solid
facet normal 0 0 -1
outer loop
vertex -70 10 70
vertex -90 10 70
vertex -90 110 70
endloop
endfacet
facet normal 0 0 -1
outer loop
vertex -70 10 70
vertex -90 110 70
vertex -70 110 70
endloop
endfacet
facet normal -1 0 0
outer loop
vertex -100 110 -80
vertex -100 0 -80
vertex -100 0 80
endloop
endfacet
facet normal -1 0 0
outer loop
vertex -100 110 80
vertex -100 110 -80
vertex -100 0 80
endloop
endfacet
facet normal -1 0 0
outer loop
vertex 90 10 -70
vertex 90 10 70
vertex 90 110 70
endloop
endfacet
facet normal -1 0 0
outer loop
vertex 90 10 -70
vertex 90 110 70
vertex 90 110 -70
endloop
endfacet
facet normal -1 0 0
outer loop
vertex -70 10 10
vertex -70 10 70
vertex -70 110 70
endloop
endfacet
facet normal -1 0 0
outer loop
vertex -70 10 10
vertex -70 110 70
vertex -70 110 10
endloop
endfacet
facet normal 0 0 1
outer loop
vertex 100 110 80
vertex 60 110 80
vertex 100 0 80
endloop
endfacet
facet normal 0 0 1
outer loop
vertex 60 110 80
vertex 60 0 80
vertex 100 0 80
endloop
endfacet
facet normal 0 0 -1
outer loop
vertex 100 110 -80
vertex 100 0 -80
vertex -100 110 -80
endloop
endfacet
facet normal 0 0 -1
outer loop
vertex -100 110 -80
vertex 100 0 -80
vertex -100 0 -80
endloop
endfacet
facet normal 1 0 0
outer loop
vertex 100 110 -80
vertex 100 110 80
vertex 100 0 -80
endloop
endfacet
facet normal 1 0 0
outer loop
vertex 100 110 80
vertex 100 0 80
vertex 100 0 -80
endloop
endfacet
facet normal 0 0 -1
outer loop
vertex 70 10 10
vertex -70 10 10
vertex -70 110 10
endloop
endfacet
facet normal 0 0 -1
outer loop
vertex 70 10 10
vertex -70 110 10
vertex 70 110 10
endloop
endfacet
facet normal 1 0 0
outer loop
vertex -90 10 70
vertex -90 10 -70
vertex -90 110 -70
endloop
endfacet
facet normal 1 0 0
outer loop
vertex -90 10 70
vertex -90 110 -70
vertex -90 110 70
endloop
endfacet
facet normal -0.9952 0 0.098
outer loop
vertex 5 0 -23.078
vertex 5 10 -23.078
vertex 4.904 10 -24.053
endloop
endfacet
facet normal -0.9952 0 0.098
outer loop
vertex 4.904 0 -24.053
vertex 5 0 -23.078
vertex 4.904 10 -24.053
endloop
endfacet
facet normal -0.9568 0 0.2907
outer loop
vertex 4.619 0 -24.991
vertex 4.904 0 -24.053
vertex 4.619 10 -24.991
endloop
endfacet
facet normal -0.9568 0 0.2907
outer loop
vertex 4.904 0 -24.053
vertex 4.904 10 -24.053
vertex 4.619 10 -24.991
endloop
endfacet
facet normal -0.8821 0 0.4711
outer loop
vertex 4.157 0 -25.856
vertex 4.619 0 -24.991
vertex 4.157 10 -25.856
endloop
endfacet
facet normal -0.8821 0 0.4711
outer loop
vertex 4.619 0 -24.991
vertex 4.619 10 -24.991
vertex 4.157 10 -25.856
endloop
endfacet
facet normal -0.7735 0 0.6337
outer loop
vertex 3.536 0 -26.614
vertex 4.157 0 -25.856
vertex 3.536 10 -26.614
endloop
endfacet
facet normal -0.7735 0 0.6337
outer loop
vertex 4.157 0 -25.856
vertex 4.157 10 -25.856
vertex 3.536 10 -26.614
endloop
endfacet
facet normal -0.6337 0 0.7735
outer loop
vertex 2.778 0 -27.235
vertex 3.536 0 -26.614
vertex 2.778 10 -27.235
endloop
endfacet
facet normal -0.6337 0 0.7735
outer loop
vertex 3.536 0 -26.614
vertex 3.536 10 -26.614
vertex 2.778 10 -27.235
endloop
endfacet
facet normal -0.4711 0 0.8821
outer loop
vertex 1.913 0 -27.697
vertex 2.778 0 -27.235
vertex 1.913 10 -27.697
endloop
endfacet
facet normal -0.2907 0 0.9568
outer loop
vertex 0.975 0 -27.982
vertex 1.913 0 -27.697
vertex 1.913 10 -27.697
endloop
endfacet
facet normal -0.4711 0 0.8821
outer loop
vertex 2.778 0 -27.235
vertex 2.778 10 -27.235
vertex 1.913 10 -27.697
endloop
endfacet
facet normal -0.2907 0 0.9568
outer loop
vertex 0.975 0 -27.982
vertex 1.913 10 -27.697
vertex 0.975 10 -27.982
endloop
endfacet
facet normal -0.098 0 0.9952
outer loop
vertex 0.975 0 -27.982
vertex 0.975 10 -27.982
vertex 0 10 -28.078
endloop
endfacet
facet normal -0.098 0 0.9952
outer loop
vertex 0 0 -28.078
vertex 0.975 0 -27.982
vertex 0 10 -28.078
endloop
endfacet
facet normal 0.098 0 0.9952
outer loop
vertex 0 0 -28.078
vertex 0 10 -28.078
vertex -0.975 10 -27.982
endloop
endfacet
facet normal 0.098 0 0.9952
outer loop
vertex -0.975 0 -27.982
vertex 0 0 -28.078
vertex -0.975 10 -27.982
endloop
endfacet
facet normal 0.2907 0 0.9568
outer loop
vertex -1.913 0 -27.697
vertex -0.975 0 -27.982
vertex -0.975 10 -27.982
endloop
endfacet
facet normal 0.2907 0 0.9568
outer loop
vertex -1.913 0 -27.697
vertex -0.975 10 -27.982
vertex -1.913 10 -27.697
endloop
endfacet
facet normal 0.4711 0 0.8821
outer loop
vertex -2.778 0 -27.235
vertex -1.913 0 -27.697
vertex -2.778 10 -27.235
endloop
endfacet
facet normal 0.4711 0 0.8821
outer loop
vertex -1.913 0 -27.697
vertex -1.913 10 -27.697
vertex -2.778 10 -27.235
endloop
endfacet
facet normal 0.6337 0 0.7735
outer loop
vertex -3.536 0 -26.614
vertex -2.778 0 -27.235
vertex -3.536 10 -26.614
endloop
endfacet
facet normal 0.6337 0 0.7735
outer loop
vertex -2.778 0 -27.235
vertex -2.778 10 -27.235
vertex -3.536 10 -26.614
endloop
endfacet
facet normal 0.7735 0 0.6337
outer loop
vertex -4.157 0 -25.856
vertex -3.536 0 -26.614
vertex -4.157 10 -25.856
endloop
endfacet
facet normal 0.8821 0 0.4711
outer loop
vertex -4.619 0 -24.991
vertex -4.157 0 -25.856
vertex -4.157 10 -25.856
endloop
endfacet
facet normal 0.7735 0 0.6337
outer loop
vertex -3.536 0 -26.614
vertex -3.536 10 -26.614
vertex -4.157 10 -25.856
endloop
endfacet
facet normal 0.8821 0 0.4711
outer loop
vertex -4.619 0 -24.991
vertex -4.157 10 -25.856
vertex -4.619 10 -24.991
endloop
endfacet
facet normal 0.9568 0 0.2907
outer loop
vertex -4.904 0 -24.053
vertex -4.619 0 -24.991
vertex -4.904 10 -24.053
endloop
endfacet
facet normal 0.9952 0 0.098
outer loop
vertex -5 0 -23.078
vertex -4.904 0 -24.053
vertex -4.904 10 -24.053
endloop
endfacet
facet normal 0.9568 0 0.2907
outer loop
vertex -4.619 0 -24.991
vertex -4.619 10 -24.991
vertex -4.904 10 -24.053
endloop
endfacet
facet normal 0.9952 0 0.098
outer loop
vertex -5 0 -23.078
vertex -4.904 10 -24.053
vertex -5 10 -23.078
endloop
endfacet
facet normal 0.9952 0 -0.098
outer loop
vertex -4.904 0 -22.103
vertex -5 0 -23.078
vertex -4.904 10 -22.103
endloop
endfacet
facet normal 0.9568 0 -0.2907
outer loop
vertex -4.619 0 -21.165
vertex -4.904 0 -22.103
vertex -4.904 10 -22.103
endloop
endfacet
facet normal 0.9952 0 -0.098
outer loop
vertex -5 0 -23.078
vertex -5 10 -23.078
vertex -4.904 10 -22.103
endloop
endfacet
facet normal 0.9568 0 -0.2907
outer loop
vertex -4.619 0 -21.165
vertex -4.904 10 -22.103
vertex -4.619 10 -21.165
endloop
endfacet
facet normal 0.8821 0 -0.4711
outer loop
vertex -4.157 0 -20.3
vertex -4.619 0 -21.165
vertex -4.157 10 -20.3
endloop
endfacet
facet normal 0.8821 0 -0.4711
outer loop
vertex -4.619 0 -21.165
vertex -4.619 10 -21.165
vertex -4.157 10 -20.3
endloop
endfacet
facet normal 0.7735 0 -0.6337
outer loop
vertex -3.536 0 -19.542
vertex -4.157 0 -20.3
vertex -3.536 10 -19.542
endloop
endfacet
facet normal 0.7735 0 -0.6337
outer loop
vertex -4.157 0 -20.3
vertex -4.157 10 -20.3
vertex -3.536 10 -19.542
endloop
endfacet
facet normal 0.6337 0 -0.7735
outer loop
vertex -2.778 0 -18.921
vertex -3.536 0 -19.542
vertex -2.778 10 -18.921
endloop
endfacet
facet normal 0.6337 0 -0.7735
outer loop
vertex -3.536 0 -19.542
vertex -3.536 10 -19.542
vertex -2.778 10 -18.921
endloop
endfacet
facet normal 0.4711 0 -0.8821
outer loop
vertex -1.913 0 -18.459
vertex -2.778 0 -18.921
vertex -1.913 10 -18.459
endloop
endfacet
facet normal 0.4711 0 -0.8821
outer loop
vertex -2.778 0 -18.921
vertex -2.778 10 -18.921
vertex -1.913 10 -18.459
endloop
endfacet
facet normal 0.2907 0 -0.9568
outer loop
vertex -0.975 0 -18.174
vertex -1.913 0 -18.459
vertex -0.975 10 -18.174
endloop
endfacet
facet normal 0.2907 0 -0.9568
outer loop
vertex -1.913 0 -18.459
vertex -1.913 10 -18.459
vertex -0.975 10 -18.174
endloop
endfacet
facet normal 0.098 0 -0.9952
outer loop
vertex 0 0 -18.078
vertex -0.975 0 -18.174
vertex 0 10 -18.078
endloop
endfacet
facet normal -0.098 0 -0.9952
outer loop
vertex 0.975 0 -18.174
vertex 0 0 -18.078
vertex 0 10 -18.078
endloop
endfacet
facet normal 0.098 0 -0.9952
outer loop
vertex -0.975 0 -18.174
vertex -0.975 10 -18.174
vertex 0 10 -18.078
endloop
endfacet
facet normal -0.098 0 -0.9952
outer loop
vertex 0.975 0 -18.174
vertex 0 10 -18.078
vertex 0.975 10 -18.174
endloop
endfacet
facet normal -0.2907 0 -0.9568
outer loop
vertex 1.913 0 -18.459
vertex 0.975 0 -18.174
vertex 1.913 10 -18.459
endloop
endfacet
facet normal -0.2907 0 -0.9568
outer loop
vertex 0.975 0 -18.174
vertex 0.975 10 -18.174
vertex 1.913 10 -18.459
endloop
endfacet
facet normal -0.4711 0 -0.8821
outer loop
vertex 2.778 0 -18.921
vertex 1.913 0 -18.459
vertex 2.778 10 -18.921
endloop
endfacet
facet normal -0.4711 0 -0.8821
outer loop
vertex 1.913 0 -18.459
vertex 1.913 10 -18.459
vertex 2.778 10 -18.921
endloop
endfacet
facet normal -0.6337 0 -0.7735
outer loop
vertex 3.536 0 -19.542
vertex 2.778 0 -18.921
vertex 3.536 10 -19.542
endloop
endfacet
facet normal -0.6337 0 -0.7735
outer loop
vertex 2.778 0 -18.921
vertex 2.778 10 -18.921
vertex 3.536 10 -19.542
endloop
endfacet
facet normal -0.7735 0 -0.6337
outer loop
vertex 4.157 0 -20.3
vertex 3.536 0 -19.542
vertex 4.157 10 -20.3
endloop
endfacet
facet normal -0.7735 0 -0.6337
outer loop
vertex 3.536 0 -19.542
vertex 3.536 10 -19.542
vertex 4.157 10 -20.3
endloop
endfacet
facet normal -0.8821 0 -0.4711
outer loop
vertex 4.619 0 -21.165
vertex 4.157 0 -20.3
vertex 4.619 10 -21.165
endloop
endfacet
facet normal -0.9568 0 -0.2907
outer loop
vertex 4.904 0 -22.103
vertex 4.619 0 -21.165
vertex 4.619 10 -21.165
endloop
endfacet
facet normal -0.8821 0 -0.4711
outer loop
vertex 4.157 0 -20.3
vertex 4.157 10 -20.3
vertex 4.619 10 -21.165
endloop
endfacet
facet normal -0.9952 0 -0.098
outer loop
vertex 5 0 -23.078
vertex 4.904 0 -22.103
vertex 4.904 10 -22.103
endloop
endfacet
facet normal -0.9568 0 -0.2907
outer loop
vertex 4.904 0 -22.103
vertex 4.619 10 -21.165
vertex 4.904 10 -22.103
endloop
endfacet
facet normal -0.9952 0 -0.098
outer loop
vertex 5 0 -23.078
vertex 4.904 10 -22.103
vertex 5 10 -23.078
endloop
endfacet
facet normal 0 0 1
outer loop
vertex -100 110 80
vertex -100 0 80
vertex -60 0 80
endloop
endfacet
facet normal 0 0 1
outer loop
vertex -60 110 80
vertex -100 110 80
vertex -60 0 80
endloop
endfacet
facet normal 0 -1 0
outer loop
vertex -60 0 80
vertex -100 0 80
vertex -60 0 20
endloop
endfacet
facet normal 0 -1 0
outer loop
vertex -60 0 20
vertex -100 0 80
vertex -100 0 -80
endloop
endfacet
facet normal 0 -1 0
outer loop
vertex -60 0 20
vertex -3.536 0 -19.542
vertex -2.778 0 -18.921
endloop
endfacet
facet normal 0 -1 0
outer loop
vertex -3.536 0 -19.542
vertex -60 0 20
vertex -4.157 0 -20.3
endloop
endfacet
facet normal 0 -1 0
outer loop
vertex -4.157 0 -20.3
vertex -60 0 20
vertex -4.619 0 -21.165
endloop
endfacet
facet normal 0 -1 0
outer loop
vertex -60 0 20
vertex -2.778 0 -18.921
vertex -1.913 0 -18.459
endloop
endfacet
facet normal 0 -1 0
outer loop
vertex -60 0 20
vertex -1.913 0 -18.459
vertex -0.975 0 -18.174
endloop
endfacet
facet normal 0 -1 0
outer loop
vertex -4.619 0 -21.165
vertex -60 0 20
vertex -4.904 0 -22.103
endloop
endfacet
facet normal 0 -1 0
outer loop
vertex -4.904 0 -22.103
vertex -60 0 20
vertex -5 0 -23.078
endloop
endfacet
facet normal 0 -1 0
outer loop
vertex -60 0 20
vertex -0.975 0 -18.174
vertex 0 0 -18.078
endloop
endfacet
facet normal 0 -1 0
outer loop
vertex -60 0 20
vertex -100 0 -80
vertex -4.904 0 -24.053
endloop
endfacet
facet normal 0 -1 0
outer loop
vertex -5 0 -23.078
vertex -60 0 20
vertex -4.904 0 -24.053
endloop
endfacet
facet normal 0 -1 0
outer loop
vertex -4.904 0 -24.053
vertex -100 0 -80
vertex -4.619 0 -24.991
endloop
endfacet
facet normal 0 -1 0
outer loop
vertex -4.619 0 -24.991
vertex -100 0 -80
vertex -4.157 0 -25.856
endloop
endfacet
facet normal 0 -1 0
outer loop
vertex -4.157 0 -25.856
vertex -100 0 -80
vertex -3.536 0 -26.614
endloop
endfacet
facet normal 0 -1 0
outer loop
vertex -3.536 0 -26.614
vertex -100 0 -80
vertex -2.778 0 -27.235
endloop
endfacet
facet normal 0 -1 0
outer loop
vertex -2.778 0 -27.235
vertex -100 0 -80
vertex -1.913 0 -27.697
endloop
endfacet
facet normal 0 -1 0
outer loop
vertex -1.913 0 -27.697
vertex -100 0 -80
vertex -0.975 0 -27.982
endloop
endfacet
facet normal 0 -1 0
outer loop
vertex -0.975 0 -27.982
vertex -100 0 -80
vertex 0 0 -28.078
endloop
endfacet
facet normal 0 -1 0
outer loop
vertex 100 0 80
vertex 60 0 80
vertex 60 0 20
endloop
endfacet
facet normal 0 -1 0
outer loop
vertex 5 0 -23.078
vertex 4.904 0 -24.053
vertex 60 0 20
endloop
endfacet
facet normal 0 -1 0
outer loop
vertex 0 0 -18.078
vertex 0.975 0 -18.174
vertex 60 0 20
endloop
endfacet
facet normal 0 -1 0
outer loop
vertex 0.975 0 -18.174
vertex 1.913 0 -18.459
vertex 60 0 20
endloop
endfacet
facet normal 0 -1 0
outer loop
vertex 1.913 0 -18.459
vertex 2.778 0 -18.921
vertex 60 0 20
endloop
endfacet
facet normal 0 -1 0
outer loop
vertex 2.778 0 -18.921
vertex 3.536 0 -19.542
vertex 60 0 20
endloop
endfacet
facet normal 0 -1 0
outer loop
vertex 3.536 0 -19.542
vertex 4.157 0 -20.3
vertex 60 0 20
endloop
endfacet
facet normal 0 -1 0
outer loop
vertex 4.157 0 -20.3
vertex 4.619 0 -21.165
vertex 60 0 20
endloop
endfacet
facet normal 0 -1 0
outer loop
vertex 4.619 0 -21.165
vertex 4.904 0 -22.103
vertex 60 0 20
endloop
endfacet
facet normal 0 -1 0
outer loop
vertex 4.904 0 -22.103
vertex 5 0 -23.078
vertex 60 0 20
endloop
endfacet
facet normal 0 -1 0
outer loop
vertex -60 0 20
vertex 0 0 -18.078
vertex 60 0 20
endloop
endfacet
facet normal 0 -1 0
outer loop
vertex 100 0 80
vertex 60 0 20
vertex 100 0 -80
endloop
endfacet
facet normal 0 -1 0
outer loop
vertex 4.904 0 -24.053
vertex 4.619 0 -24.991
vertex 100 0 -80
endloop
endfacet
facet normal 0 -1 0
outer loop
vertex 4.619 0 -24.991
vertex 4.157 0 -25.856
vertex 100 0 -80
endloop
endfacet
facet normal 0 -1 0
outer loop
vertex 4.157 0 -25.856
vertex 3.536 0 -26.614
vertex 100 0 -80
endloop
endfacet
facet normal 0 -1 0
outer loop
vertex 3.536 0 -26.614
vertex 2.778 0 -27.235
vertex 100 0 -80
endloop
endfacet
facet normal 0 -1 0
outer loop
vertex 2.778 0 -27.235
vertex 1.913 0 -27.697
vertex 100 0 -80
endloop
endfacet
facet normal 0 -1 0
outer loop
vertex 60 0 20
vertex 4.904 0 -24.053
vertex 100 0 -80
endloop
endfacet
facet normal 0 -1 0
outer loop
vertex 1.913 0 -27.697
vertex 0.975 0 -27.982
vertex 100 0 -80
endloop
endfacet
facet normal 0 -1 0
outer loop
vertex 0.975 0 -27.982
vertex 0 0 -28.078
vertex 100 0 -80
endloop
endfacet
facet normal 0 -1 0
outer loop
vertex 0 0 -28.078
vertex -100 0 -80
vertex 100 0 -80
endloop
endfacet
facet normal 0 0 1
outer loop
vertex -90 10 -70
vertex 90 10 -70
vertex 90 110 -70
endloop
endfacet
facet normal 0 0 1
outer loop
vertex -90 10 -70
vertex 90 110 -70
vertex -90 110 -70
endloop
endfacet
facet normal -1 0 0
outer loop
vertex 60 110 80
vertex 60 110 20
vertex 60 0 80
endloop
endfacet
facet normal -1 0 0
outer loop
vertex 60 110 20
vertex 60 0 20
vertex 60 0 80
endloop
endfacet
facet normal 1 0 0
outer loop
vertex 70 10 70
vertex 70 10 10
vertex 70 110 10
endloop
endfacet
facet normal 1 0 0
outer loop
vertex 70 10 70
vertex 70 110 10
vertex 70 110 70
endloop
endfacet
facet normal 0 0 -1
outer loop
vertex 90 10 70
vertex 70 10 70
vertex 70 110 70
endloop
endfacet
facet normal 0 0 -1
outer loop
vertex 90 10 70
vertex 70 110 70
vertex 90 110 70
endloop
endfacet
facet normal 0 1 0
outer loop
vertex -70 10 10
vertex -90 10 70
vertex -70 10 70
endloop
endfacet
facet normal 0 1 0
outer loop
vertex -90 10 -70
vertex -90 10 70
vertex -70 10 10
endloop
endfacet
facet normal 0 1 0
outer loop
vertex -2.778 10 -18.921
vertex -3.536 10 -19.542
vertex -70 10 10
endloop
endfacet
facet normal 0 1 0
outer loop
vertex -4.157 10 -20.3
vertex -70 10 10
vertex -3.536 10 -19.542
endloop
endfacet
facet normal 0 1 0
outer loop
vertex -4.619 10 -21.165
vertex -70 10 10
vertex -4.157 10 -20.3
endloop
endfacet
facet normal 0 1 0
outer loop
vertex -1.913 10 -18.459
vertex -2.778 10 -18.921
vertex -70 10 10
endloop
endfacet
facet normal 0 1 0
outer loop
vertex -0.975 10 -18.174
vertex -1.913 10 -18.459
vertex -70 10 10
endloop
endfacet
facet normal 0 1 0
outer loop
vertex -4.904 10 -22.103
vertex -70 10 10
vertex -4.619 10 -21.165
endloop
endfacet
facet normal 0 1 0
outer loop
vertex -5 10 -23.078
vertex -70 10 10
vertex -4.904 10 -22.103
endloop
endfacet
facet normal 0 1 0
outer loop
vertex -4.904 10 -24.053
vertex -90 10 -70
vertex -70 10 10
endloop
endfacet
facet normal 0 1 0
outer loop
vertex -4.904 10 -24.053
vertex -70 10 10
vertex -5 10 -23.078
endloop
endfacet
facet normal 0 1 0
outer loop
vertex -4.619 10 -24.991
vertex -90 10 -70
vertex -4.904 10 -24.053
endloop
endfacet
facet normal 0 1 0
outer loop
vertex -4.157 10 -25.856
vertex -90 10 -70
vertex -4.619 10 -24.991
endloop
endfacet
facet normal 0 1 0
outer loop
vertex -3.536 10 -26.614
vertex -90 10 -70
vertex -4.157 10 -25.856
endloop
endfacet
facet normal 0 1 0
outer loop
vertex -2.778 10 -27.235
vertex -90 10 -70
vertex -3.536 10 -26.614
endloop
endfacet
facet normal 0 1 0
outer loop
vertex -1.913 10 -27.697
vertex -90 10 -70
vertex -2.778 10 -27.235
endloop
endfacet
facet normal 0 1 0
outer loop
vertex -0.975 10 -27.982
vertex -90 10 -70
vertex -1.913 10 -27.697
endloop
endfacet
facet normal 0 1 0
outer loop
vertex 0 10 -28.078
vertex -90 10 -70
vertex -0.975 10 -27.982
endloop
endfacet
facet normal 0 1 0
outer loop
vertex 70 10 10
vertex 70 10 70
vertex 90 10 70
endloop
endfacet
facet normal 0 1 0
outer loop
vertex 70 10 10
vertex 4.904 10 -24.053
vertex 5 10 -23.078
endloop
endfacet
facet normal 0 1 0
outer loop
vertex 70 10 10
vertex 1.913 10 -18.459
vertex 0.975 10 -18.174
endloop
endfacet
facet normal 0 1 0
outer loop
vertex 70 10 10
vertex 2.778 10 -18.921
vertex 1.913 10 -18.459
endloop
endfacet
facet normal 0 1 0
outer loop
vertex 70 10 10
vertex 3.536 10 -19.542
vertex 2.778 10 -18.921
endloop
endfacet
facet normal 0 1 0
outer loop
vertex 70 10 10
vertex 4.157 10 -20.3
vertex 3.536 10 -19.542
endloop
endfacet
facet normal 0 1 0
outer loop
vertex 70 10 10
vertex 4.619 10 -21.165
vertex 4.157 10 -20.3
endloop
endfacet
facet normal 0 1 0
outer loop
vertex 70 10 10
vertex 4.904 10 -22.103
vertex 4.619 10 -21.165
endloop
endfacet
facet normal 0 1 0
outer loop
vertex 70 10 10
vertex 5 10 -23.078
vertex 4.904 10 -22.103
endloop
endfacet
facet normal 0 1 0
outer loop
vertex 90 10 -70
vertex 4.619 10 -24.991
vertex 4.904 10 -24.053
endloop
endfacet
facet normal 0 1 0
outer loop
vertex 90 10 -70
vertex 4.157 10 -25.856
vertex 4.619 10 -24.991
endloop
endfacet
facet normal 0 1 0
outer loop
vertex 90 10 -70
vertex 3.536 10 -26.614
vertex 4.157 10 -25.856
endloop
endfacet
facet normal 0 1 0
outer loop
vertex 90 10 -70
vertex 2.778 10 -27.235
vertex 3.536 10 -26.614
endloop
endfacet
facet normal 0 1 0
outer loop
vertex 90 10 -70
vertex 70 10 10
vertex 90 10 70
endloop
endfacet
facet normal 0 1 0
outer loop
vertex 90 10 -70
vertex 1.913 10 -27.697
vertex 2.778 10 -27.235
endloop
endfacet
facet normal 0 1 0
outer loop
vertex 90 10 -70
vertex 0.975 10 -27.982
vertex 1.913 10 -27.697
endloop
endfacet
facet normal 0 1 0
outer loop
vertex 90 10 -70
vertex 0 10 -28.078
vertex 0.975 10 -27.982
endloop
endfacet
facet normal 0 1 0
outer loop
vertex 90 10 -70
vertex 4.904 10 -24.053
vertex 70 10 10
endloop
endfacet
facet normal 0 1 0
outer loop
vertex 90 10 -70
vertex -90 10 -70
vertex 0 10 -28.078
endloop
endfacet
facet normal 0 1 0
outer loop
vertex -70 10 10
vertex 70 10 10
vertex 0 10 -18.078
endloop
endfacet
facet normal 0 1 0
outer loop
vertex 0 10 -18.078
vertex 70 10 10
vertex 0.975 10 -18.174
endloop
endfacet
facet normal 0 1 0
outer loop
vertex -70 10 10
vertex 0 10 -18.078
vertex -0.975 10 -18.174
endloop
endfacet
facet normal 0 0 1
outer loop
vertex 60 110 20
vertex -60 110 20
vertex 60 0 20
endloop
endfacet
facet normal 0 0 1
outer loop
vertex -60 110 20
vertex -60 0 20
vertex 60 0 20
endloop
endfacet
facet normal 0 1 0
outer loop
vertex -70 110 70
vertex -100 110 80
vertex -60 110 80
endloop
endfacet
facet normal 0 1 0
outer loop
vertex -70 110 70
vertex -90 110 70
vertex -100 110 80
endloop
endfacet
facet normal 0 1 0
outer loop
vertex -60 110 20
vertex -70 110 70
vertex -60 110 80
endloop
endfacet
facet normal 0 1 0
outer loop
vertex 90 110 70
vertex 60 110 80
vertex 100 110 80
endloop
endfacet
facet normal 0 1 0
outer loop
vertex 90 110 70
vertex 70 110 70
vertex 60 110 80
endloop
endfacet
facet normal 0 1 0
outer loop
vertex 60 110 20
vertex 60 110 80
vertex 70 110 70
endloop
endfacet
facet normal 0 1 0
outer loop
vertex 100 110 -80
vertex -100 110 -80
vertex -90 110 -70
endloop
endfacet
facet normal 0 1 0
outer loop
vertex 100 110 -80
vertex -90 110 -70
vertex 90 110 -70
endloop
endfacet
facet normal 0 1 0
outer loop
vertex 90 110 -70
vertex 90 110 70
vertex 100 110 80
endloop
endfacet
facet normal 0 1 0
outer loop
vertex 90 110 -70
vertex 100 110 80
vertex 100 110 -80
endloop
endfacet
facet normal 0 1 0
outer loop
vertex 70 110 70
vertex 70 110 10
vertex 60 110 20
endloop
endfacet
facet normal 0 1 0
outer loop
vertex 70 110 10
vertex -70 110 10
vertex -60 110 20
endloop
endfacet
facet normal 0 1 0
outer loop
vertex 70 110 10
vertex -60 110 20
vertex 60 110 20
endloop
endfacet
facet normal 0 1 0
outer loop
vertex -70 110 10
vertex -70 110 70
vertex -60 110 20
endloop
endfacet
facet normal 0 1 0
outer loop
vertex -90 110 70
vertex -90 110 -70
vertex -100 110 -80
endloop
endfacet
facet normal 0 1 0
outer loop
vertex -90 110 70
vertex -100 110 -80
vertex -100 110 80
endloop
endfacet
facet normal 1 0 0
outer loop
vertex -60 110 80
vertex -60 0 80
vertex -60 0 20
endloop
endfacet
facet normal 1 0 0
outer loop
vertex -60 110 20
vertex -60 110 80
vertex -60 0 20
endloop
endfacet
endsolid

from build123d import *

# Parameters (mm, degrees)
BOSS_EXTRUDE1_DEPTH = 10
BOSS_EXTRUDE2_DEPTH = 100
SKETCH4_R           = 5
CUT_EXTRUDE1_DEPTH  = 10


with BuildPart() as part:
    # Sketch2 → Boss-Extrude1 (new body)
    with BuildSketch(Plane(origin=(0, 0, 0), x_dir=(1, 0, 0), z_dir=(0, 1, 0))):
        Polygon((-60, -80), (-60, -20), (60, -20), (60, -80), (100, -80), (100, 80), (-100, 80), (-100, -80), align=None)
    extrude(amount=BOSS_EXTRUDE1_DEPTH)

    # Sketch3 → Boss-Extrude2 (add)
    with BuildSketch(Plane(origin=(0, 10, 0), x_dir=(1, 0, 0), z_dir=(0, 1, 0))):
        Polygon((-60, -80), (-60, -20), (60, -20), (60, -80), (100, -80), (100, 80), (-100, 80), (-100, -80), align=None)
        Polygon((90, 70), (-90, 70), (-90, -70), (-70, -70), (-70, -10), (70, -10), (70, -70), (90, -70), align=None, mode=Mode.SUBTRACT)
    extrude(amount=BOSS_EXTRUDE2_DEPTH)

    # Sketch4 → Cut-Extrude1 (cut)
    with BuildSketch(Plane(origin=(0, 10, 0), x_dir=(1, 0, 0), z_dir=(0, 1, 0))):
        with Locations((0, 23.078006165)):
            Circle(SKETCH4_R)
    extrude(amount=-CUT_EXTRUDE1_DEPTH, mode=Mode.SUBTRACT)


solid = part.part
